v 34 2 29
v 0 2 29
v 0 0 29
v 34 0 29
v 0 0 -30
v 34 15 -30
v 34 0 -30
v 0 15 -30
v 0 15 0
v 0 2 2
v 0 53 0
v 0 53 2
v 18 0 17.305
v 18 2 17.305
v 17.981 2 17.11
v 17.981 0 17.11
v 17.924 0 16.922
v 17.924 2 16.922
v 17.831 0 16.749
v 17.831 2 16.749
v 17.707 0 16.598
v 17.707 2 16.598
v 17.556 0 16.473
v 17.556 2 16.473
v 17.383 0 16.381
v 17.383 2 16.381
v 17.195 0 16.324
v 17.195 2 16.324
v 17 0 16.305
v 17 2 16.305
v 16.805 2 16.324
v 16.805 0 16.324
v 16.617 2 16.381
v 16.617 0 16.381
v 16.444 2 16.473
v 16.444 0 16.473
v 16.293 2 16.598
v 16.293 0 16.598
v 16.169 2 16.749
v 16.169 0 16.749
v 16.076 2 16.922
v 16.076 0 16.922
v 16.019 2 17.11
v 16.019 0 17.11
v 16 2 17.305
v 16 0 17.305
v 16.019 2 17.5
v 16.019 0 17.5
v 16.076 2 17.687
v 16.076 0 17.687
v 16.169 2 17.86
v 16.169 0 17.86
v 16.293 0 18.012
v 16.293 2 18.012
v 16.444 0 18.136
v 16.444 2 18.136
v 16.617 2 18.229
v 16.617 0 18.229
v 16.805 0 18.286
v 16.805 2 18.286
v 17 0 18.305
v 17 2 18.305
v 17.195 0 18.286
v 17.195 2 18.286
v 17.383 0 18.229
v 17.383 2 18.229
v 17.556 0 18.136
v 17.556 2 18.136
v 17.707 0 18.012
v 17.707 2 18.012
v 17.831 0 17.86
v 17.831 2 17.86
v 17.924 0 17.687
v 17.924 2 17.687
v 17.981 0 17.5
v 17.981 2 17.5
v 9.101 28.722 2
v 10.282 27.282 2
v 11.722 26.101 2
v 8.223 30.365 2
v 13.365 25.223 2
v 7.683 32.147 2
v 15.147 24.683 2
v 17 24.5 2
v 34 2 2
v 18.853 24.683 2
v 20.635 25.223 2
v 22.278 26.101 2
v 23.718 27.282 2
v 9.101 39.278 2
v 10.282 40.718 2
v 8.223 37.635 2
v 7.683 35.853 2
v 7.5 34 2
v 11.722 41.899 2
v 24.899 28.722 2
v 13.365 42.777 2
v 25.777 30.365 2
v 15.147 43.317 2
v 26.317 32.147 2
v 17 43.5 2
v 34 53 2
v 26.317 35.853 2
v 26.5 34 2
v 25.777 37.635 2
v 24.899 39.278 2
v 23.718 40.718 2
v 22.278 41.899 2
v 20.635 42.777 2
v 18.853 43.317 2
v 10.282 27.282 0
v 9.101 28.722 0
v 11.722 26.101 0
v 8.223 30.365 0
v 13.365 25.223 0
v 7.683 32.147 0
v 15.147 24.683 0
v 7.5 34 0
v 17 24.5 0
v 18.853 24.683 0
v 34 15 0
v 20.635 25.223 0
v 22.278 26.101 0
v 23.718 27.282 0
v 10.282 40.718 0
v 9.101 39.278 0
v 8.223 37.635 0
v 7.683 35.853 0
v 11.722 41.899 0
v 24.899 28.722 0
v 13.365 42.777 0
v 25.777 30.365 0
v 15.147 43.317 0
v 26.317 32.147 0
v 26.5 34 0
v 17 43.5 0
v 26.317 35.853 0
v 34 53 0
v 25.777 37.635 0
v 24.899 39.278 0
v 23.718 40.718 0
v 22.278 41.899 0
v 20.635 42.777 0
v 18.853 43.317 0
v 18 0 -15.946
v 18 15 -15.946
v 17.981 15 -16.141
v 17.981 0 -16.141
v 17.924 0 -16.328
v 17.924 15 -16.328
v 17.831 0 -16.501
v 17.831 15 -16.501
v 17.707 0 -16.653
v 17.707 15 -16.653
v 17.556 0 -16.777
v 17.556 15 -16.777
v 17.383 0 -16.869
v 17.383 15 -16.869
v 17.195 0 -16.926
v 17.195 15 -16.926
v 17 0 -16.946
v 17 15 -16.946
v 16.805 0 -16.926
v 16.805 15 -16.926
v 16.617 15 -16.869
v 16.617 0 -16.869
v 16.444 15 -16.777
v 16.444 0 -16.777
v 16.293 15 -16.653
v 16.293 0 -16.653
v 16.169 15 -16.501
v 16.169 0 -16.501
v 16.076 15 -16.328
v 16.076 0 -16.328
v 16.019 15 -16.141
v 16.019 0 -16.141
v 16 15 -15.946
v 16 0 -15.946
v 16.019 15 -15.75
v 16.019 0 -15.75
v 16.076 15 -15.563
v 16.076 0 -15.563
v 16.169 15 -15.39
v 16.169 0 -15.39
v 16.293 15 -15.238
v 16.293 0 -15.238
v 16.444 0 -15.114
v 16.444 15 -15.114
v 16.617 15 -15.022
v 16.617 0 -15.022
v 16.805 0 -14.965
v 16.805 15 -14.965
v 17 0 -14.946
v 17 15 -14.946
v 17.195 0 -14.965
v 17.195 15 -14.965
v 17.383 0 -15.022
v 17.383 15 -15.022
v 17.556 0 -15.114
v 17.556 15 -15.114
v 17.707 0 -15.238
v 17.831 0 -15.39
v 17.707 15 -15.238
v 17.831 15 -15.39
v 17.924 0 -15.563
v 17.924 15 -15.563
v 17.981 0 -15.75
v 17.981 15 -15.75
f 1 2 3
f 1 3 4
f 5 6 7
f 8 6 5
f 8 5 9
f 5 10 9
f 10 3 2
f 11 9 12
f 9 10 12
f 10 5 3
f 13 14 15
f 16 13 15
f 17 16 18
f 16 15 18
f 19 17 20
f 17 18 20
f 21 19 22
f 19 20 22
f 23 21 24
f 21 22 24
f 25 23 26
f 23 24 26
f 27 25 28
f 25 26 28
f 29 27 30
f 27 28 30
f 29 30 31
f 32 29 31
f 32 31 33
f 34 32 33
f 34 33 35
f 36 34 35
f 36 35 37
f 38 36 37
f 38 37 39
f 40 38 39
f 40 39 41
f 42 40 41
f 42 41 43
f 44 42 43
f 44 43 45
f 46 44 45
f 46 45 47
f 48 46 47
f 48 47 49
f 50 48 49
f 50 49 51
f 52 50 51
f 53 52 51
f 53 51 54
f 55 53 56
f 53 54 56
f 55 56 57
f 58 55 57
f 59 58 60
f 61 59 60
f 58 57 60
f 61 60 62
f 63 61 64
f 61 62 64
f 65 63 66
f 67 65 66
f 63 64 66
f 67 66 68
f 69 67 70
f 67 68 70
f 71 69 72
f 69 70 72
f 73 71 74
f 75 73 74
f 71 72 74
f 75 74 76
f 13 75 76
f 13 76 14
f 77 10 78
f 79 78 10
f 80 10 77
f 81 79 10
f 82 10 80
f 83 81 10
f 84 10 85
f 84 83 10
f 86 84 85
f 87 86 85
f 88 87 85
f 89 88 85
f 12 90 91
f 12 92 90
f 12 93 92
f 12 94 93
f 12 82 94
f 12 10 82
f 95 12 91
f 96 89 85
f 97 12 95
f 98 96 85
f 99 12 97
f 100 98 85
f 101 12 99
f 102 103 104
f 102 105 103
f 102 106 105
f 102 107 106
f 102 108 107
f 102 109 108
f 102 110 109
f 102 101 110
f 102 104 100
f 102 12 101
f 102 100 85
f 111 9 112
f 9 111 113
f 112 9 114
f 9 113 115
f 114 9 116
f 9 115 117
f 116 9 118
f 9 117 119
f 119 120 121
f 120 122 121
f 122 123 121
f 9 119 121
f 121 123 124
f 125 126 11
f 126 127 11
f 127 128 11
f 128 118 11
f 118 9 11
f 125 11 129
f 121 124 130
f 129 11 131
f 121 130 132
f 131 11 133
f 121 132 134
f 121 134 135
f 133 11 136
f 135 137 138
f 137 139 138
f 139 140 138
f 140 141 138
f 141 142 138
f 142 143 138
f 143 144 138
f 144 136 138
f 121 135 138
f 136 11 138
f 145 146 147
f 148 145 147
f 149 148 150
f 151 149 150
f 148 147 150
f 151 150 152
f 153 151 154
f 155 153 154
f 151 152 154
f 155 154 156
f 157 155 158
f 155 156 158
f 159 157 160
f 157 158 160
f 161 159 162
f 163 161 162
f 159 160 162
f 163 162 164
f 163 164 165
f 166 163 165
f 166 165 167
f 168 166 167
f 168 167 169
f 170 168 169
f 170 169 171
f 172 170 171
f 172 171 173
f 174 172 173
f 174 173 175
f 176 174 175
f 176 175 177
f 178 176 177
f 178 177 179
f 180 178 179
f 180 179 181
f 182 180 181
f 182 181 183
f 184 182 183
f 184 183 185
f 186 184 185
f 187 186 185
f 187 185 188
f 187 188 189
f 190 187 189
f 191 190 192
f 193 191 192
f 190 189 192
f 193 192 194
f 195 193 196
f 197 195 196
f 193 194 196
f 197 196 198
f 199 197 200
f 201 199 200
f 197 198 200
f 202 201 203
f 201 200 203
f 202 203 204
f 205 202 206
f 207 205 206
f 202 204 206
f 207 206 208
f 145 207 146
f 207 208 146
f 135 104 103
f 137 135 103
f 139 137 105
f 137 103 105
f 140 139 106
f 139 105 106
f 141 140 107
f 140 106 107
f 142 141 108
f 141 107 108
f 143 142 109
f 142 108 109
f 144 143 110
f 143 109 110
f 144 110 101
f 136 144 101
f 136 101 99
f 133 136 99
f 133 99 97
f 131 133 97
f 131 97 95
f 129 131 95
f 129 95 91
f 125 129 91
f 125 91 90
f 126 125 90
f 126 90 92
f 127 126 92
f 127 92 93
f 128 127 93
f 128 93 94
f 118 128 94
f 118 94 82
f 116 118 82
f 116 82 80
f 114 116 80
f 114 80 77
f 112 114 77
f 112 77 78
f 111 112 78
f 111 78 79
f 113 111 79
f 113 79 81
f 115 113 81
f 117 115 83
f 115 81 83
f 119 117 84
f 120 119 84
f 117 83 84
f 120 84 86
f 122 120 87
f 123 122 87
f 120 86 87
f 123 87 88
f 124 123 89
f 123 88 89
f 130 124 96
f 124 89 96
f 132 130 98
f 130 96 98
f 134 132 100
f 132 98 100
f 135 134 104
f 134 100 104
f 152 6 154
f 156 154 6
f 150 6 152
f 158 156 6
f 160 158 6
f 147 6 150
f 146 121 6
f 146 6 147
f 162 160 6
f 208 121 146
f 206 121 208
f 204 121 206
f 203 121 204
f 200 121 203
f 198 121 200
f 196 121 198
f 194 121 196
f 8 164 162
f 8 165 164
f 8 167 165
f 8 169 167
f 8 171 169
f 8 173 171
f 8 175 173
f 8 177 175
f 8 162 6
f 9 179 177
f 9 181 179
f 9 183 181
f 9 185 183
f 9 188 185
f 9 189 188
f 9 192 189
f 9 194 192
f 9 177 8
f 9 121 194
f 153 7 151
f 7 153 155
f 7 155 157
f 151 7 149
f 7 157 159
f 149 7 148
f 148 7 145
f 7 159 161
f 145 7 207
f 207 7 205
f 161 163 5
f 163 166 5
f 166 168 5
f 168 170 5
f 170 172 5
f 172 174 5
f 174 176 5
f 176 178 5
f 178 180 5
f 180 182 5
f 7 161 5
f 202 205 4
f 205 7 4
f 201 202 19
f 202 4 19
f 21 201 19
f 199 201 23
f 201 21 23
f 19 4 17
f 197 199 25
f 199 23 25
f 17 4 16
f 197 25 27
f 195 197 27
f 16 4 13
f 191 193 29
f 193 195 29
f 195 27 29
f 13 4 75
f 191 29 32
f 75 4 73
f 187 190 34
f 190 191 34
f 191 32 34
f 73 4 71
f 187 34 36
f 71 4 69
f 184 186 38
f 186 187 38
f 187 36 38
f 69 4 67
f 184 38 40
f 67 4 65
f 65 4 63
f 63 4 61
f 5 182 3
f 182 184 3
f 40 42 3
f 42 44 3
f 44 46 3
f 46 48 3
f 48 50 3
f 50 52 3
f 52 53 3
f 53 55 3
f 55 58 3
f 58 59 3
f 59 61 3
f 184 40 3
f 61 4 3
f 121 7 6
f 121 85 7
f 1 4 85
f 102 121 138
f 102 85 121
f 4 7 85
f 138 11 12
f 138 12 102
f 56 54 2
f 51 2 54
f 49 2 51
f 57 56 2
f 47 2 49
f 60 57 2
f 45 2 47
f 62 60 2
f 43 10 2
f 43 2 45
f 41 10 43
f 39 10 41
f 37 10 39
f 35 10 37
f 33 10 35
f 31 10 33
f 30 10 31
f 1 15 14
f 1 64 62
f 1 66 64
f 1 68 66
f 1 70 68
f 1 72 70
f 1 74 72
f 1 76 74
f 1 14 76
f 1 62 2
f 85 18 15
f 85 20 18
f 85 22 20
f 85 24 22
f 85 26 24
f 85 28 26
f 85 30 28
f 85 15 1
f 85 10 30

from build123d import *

# Parameters (mm, degrees)
SKETCH1_W                    = 34
SKETCH1_H                    = 53
BOSS_EXTRUDE1_DEPTH          = 2
SKETCH2_W                    = 34
SKETCH2_H                    = 2
BOSS_EXTRUDE2_DEPTH          = 27
SKETCH3_W                    = 34
SKETCH3_H                    = 15
BOSS_EXTRUDE3_DEPTH          = 30
SKETCH4_R                    = 9.5
CUT_EXTRUDE1_DEPTH           = 71.632853546
F_94_0_0071_DIAMETER_HOLE1_D = 2.000000064


with BuildPart() as part:
    # Sketch1 → Boss-Extrude1 (new body)
    with BuildSketch(Plane.XY):
        with Locations((17, 26.5)):
            Rectangle(SKETCH1_W, SKETCH1_H)
    extrude(amount=BOSS_EXTRUDE1_DEPTH)

    # Sketch2 → Boss-Extrude2 (add)
    with BuildSketch(Plane.XY.offset(2)):
        with Locations((17, 1)):
            Rectangle(SKETCH2_W, SKETCH2_H)
    extrude(amount=BOSS_EXTRUDE2_DEPTH)

    # Sketch3 → Boss-Extrude3 (add)
    with BuildSketch(Plane(origin=(0, 0, 0), x_dir=(-1, 0, 0), z_dir=(0, 0, -1))):
        with Locations((-17, 7.5)):
            Rectangle(SKETCH3_W, SKETCH3_H)
    extrude(amount=BOSS_EXTRUDE3_DEPTH)

    # Sketch4 → Cut-Extrude1 (cut, through all)
    with BuildSketch(Plane.XY.offset(2)):
        with Locations((17, 34)):
            Circle(SKETCH4_R)
    extrude(amount=-CUT_EXTRUDE1_DEPTH, mode=Mode.SUBTRACT)

    # #94 (0.0071) Diameter Hole1 (through all)
    with Locations(Plane(origin=(0, 0, 0), x_dir=(-1, 0, 0), z_dir=(0, -1, 0))):
        with Locations((-17, -17.304753764), (-17, 15.945587516)):
            Hole(F_94_0_0071_DIAMETER_HOLE1_D / 2)


solid = part.part
